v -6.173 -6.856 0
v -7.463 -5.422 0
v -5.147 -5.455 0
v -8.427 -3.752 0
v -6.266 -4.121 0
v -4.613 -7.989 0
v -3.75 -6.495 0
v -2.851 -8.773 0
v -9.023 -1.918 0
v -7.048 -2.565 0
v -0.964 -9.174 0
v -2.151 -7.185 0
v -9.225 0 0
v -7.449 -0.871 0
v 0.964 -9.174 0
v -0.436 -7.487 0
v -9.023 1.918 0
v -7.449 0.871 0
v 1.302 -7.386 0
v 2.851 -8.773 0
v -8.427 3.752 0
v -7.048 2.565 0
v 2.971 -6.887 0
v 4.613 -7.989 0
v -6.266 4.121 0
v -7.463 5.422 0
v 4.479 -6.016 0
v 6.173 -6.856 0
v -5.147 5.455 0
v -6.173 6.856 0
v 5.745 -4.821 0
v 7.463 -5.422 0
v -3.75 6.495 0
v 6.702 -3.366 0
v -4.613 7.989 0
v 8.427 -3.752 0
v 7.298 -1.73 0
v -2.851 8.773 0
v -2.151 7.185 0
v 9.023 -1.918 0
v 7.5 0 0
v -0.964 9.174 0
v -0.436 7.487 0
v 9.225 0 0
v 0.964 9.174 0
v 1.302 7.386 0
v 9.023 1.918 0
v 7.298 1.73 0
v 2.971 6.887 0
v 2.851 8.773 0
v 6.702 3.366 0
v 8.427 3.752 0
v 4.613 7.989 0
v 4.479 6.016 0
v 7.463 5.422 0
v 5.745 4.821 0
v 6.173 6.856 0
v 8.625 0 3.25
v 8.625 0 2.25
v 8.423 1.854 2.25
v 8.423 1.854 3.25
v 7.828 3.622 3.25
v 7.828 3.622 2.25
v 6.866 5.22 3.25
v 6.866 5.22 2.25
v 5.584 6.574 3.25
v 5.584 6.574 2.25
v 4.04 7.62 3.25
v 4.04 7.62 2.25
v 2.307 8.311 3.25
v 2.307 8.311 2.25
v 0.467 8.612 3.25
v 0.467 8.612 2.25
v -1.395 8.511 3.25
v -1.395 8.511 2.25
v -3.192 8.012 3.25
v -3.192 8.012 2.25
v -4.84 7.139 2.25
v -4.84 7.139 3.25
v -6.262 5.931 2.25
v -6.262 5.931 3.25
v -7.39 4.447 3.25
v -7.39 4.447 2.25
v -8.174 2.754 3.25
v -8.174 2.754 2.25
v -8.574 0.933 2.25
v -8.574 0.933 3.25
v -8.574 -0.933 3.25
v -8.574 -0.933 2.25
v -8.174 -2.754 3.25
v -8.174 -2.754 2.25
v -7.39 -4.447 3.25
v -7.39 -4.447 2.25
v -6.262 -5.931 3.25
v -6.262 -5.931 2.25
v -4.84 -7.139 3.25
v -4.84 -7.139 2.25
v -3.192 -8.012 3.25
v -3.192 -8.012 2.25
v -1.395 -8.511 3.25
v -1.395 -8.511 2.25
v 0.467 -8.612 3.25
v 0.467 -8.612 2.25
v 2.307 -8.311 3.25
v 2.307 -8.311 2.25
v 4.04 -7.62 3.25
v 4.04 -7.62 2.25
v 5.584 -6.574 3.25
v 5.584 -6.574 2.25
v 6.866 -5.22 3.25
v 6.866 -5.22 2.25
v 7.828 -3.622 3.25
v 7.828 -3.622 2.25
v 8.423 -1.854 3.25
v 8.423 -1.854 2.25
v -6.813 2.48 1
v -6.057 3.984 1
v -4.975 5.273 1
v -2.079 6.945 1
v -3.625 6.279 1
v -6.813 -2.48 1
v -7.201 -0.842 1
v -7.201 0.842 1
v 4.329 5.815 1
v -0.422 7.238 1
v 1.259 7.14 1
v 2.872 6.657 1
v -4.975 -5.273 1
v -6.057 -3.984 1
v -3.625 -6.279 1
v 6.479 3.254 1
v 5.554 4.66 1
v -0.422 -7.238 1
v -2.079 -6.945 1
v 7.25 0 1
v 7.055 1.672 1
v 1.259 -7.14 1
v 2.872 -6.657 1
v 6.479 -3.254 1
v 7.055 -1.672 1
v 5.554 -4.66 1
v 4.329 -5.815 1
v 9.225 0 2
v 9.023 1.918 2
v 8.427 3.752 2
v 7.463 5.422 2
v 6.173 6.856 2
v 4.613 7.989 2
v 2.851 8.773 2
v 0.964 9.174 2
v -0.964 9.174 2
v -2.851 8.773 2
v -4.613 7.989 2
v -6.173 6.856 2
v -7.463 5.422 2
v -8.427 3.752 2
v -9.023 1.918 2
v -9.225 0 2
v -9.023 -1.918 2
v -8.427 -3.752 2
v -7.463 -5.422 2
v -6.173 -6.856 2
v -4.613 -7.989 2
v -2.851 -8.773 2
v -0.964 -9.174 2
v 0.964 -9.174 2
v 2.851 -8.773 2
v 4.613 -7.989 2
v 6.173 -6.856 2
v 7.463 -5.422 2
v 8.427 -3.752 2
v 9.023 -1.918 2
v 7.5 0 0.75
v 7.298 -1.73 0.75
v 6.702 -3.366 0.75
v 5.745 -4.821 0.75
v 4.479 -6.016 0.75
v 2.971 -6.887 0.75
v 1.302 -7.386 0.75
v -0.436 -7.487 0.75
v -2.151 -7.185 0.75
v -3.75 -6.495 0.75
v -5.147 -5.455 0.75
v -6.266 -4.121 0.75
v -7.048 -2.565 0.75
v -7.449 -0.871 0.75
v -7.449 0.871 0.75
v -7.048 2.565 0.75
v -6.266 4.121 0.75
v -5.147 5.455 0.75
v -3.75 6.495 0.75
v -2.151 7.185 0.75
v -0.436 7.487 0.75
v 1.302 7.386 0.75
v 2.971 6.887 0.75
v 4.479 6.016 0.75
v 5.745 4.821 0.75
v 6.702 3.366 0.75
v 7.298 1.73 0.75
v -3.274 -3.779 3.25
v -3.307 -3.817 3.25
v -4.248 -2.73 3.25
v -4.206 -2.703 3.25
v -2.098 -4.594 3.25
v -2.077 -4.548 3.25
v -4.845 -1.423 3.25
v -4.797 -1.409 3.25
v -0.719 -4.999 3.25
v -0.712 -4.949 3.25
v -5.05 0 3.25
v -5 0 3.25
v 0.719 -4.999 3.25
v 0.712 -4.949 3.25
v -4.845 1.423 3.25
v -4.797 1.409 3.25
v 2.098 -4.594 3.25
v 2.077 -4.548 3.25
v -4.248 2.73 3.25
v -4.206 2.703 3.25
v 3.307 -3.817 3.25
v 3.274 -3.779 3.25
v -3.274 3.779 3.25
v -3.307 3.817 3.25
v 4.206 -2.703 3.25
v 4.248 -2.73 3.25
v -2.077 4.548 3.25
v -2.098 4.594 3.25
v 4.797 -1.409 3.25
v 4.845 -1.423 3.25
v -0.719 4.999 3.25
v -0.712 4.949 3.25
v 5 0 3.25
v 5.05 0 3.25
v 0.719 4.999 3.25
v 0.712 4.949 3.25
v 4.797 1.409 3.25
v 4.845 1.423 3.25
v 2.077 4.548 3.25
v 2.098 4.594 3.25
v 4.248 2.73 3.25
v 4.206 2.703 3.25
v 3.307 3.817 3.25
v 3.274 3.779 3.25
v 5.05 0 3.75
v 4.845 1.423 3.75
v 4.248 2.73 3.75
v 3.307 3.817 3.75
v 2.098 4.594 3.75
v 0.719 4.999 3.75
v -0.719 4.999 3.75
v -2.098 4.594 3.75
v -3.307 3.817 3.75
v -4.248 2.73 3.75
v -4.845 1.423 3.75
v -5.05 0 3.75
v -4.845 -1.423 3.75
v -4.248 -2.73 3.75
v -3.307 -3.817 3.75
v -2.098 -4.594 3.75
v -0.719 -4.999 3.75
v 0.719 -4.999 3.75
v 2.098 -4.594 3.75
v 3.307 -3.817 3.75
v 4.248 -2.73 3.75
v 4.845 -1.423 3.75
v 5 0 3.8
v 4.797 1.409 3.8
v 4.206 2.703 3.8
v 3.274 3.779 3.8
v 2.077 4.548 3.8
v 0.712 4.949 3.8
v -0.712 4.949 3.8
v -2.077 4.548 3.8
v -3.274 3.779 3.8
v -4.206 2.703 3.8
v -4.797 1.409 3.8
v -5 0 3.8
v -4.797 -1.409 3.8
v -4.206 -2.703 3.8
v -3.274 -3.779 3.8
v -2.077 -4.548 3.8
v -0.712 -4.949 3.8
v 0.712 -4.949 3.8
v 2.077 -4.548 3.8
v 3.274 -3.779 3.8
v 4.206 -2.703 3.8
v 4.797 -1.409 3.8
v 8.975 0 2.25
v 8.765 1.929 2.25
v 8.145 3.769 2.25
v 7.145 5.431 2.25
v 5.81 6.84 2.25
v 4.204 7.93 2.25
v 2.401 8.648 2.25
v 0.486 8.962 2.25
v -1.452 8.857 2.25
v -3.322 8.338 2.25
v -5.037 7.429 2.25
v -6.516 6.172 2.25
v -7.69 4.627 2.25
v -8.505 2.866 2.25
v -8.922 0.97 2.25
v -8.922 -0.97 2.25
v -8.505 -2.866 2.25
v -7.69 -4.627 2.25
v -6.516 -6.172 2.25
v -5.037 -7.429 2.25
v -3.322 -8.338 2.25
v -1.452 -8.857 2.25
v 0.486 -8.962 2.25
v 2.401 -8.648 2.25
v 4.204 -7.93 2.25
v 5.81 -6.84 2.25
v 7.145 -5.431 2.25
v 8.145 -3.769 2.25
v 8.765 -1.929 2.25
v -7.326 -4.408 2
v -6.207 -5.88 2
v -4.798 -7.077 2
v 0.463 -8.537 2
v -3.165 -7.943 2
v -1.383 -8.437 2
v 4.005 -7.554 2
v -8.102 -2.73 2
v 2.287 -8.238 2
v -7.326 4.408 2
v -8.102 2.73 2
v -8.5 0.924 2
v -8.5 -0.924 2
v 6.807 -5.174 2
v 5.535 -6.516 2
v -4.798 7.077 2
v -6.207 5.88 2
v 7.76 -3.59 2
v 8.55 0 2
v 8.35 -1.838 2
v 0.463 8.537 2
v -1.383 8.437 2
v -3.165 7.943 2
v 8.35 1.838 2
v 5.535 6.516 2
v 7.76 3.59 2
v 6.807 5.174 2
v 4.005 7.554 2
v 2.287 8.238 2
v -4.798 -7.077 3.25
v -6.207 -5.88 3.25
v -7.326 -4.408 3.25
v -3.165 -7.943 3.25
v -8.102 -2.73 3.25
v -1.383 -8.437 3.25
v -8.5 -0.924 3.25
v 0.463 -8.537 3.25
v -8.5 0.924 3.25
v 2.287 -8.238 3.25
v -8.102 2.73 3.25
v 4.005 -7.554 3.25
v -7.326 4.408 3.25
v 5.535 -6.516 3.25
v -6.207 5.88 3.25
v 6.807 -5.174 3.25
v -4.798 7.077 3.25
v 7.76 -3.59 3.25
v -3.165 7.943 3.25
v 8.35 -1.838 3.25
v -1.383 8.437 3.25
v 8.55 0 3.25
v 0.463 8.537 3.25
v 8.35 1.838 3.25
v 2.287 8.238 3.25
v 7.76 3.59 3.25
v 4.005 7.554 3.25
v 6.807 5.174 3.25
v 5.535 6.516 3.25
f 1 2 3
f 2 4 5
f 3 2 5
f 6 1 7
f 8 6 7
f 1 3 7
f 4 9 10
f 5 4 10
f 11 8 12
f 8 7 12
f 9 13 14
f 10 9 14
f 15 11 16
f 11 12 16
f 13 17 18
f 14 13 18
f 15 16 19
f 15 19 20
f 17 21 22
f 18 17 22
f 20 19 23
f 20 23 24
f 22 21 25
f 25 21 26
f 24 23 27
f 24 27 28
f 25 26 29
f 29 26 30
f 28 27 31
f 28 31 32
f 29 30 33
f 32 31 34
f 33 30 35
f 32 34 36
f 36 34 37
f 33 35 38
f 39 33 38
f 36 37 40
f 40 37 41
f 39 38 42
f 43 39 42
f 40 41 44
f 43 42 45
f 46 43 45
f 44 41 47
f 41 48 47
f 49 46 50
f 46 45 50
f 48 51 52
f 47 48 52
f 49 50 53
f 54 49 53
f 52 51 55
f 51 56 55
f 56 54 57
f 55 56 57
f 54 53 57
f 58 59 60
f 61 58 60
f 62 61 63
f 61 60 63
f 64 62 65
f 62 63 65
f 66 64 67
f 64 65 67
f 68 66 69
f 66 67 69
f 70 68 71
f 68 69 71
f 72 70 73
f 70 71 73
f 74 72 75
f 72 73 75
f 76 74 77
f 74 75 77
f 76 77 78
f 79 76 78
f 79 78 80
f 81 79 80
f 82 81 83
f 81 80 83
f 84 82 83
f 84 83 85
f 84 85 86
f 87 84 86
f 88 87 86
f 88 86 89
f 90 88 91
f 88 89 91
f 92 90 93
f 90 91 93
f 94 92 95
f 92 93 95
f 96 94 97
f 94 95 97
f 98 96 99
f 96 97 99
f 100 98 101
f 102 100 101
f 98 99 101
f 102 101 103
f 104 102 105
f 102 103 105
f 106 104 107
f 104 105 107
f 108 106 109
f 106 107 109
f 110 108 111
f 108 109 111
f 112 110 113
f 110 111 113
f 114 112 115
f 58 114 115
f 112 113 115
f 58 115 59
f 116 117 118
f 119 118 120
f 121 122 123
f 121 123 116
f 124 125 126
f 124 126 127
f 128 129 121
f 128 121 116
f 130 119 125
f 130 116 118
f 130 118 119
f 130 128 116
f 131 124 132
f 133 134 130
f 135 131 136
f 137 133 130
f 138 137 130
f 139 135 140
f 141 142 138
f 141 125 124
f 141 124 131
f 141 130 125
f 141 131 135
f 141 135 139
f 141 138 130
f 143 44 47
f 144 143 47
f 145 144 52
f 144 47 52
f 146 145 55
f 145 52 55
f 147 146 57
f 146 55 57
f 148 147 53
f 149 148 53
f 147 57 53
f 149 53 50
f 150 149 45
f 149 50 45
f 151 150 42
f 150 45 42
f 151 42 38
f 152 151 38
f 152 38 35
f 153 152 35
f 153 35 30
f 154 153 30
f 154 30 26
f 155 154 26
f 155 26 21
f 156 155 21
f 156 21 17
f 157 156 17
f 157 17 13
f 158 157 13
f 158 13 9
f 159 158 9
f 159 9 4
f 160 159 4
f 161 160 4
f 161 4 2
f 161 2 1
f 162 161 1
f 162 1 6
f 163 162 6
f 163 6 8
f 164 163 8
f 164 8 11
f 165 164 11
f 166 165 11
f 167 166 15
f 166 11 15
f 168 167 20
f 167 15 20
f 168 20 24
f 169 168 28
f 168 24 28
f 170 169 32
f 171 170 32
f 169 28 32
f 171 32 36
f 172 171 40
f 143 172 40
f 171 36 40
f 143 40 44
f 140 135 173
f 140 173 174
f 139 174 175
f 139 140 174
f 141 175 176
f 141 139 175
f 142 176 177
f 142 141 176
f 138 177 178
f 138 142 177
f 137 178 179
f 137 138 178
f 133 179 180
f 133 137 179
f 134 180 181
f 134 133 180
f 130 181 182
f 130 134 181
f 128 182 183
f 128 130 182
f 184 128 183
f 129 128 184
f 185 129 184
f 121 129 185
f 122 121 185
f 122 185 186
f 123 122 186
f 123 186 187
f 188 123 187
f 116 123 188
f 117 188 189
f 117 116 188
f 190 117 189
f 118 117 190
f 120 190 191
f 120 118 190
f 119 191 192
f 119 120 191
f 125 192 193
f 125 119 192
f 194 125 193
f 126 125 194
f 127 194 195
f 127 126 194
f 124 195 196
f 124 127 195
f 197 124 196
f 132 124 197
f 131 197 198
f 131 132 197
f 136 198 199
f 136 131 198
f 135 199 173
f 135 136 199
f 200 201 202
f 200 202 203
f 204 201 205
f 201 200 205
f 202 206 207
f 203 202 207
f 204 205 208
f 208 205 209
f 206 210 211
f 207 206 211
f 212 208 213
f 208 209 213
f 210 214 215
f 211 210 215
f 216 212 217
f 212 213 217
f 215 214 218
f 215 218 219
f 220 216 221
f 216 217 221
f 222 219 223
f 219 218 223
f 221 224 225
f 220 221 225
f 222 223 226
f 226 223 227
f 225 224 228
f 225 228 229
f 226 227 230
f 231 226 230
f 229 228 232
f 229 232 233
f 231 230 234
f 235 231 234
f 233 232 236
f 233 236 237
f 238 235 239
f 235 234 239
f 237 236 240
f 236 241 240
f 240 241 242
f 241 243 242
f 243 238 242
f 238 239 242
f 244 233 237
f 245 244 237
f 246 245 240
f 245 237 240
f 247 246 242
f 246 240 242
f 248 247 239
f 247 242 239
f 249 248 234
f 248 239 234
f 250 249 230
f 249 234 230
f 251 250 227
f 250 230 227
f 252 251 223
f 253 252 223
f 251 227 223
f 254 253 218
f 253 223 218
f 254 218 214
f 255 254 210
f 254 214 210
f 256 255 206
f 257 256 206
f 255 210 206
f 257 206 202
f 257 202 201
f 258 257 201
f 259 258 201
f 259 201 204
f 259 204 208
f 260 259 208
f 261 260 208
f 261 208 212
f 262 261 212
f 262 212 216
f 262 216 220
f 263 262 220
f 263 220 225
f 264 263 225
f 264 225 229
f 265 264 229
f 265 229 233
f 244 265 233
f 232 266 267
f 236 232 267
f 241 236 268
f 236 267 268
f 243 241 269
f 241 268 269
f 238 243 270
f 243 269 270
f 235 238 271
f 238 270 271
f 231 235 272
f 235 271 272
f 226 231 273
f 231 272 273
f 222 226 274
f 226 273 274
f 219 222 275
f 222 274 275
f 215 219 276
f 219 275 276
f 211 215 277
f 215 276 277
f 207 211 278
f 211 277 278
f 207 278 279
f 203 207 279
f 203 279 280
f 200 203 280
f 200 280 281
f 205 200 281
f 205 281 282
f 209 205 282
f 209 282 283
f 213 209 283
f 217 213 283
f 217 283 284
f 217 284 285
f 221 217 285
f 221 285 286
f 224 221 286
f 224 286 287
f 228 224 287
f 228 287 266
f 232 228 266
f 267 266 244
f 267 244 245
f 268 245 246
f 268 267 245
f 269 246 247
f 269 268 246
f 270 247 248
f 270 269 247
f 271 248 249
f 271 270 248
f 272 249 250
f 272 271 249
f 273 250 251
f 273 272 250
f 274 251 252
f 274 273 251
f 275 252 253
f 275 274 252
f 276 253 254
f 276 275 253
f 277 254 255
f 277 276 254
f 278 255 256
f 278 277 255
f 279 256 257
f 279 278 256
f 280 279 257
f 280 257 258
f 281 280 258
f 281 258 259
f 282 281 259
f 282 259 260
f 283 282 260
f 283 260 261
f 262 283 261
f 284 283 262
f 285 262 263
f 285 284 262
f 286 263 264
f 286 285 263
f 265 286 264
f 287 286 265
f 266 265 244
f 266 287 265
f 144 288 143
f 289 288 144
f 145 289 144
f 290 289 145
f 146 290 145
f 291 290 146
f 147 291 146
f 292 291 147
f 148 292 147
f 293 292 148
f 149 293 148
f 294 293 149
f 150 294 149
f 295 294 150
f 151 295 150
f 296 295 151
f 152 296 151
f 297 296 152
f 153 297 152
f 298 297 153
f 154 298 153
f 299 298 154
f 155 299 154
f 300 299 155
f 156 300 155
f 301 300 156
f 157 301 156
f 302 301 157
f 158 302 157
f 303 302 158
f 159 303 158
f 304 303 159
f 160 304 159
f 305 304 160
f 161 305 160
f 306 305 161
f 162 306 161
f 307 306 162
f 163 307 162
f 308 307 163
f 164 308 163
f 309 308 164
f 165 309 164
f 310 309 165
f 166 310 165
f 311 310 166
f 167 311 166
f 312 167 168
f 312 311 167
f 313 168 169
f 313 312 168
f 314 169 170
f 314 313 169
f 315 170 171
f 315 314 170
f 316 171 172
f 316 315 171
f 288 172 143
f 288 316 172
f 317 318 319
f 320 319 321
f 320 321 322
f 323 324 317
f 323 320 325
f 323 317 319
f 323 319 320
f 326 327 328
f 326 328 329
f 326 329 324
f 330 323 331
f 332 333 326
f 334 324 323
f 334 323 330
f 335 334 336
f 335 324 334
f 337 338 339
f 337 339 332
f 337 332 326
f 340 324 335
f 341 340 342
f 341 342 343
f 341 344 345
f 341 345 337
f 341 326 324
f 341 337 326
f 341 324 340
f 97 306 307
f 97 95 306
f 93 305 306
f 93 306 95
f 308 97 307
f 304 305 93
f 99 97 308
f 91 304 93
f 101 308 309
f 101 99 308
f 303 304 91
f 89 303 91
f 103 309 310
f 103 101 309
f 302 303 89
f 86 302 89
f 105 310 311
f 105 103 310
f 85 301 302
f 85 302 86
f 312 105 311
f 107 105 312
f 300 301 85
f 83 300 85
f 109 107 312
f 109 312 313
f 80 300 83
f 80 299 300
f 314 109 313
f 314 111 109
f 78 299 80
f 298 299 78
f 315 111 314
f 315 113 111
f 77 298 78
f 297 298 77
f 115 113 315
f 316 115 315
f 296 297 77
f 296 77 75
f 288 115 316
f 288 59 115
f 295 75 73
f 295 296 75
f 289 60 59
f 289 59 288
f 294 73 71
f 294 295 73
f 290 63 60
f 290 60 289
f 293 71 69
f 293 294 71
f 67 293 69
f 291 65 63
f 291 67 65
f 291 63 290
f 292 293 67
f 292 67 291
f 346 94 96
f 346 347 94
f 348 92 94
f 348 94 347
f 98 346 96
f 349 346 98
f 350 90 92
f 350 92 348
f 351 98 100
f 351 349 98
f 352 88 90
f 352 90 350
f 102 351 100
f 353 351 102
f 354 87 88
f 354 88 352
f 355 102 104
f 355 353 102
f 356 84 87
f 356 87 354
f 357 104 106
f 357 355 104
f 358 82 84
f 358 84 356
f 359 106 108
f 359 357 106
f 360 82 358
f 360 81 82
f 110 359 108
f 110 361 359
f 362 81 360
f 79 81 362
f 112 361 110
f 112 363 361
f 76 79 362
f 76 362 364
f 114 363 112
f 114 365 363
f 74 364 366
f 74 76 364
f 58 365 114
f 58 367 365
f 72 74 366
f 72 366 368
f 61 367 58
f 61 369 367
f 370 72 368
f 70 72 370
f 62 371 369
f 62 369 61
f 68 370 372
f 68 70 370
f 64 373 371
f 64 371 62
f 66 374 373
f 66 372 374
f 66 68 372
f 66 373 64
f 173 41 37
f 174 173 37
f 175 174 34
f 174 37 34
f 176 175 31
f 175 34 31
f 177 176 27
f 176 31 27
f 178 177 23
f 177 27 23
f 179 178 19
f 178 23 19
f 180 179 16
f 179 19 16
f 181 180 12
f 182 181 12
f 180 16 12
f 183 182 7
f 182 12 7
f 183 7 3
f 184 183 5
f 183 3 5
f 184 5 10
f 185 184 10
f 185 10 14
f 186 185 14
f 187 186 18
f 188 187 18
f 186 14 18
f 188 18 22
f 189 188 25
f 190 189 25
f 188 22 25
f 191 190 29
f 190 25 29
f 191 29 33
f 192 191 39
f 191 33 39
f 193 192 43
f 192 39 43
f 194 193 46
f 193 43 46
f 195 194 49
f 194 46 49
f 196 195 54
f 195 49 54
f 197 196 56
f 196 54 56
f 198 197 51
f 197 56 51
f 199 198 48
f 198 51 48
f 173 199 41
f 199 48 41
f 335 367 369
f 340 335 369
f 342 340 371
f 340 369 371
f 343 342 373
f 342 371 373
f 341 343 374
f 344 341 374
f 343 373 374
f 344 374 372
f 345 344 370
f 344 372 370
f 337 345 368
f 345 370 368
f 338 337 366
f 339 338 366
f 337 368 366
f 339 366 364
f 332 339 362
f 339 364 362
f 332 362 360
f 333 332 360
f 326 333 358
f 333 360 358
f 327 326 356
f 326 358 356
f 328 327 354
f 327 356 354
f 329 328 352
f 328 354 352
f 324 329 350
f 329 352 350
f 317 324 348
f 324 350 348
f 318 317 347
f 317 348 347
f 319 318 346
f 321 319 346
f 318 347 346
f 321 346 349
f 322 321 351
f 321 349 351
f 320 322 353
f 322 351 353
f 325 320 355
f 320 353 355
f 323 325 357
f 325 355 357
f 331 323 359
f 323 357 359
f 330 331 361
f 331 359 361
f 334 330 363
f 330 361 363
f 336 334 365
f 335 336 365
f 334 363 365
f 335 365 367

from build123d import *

# Parameters (mm, degrees)
F0_R      = 9.225
F1_DEPTH  = 2.25
F2_R      = 8.625
F3_DEPTH  = 1
F4_DEPTH  = 1
F5_R      = 5.05
F6_DEPTH  = 0.75
F7_R      = 5
F8_DEPTH  = 0.75
F10_R     = 8.55
F11_DEPTH = 1.25
F12_R     = 7.5
F13_DEPTH = 1
F14_SIZE  = 0.25


# Not quite as in the source:
# - a fillet or chamfer that OpenCascade refuses, or shapes differently, is made with other operations: its cross-section is extruded or revolved along the edge and cut away or added


with BuildPart() as f1:
    # F0 (on Top) → F1 (new body)
    with BuildSketch(Plane.XY):
        Circle(F0_R)
    extrude(amount=F1_DEPTH)

    # F2 (on face) → F3 (join)
    with BuildSketch(Plane.XY.offset(2.25)):
        Circle(F2_R)
    extrude(amount=F3_DEPTH)

    # F2 (on face) → F4 (join)
    with BuildSketch(Plane.XY.offset(2.25)):
        Circle(F2_R)
    extrude(amount=F4_DEPTH)

    # F5 (on face) → F6 (join)
    with BuildSketch(Plane.XY.offset(3.25)):
        Circle(F5_R)
    extrude(amount=F6_DEPTH)

    # F7 (on face) → F8 (cut)
    with BuildSketch(Plane.XY.offset(4)):
        Circle(F7_R)
    extrude(amount=-F8_DEPTH, mode=Mode.SUBTRACT)

    # F10 (on offset) → F11 (cut)
    with BuildSketch(Plane.XY.offset(3.25)):
        Circle(F10_R)
    extrude(amount=-F11_DEPTH, mode=Mode.SUBTRACT)

    # F12 (on face) → F13 (cut)
    with BuildSketch(Plane(origin=(0, 0, 0), x_dir=(1, 0, 0), z_dir=(0, 0, -1))):
        Circle(F12_R)
    extrude(amount=-F13_DEPTH, mode=Mode.SUBTRACT)

    # F14
    f14_edges = [f1.edges().sort_by_distance(p)[0] for p in [
        (-7.5, 0, 1),
    ]]
    chamfer(f14_edges, length=F14_SIZE)

    # F15: chamfer of 0.25 on 1 edges, made by hand

    # F15_s1 → F15_t2 (revolve, cut)
    with BuildSketch(Plane.XZ):
        Polygon((9.225, 2), (8.975, 2.25), (9.225, 2.25), align=None)
    revolve(axis=Axis((0, 0, 2.25), (0, 0, 1)), mode=Mode.SUBTRACT)

    # F15#s1: chamfer of 0.25 on 1 edges, made by hand

    # F15_s1_s1 → F15_s1_t2 (revolve, cut)
    with BuildSketch(Plane.XZ):
        Polygon((5.05, 3.75), (4.8, 4), (5.05, 4), align=None)
    revolve(axis=Axis((0, 0, 4), (0, 0, 1)), mode=Mode.SUBTRACT)


solid = f1.part
